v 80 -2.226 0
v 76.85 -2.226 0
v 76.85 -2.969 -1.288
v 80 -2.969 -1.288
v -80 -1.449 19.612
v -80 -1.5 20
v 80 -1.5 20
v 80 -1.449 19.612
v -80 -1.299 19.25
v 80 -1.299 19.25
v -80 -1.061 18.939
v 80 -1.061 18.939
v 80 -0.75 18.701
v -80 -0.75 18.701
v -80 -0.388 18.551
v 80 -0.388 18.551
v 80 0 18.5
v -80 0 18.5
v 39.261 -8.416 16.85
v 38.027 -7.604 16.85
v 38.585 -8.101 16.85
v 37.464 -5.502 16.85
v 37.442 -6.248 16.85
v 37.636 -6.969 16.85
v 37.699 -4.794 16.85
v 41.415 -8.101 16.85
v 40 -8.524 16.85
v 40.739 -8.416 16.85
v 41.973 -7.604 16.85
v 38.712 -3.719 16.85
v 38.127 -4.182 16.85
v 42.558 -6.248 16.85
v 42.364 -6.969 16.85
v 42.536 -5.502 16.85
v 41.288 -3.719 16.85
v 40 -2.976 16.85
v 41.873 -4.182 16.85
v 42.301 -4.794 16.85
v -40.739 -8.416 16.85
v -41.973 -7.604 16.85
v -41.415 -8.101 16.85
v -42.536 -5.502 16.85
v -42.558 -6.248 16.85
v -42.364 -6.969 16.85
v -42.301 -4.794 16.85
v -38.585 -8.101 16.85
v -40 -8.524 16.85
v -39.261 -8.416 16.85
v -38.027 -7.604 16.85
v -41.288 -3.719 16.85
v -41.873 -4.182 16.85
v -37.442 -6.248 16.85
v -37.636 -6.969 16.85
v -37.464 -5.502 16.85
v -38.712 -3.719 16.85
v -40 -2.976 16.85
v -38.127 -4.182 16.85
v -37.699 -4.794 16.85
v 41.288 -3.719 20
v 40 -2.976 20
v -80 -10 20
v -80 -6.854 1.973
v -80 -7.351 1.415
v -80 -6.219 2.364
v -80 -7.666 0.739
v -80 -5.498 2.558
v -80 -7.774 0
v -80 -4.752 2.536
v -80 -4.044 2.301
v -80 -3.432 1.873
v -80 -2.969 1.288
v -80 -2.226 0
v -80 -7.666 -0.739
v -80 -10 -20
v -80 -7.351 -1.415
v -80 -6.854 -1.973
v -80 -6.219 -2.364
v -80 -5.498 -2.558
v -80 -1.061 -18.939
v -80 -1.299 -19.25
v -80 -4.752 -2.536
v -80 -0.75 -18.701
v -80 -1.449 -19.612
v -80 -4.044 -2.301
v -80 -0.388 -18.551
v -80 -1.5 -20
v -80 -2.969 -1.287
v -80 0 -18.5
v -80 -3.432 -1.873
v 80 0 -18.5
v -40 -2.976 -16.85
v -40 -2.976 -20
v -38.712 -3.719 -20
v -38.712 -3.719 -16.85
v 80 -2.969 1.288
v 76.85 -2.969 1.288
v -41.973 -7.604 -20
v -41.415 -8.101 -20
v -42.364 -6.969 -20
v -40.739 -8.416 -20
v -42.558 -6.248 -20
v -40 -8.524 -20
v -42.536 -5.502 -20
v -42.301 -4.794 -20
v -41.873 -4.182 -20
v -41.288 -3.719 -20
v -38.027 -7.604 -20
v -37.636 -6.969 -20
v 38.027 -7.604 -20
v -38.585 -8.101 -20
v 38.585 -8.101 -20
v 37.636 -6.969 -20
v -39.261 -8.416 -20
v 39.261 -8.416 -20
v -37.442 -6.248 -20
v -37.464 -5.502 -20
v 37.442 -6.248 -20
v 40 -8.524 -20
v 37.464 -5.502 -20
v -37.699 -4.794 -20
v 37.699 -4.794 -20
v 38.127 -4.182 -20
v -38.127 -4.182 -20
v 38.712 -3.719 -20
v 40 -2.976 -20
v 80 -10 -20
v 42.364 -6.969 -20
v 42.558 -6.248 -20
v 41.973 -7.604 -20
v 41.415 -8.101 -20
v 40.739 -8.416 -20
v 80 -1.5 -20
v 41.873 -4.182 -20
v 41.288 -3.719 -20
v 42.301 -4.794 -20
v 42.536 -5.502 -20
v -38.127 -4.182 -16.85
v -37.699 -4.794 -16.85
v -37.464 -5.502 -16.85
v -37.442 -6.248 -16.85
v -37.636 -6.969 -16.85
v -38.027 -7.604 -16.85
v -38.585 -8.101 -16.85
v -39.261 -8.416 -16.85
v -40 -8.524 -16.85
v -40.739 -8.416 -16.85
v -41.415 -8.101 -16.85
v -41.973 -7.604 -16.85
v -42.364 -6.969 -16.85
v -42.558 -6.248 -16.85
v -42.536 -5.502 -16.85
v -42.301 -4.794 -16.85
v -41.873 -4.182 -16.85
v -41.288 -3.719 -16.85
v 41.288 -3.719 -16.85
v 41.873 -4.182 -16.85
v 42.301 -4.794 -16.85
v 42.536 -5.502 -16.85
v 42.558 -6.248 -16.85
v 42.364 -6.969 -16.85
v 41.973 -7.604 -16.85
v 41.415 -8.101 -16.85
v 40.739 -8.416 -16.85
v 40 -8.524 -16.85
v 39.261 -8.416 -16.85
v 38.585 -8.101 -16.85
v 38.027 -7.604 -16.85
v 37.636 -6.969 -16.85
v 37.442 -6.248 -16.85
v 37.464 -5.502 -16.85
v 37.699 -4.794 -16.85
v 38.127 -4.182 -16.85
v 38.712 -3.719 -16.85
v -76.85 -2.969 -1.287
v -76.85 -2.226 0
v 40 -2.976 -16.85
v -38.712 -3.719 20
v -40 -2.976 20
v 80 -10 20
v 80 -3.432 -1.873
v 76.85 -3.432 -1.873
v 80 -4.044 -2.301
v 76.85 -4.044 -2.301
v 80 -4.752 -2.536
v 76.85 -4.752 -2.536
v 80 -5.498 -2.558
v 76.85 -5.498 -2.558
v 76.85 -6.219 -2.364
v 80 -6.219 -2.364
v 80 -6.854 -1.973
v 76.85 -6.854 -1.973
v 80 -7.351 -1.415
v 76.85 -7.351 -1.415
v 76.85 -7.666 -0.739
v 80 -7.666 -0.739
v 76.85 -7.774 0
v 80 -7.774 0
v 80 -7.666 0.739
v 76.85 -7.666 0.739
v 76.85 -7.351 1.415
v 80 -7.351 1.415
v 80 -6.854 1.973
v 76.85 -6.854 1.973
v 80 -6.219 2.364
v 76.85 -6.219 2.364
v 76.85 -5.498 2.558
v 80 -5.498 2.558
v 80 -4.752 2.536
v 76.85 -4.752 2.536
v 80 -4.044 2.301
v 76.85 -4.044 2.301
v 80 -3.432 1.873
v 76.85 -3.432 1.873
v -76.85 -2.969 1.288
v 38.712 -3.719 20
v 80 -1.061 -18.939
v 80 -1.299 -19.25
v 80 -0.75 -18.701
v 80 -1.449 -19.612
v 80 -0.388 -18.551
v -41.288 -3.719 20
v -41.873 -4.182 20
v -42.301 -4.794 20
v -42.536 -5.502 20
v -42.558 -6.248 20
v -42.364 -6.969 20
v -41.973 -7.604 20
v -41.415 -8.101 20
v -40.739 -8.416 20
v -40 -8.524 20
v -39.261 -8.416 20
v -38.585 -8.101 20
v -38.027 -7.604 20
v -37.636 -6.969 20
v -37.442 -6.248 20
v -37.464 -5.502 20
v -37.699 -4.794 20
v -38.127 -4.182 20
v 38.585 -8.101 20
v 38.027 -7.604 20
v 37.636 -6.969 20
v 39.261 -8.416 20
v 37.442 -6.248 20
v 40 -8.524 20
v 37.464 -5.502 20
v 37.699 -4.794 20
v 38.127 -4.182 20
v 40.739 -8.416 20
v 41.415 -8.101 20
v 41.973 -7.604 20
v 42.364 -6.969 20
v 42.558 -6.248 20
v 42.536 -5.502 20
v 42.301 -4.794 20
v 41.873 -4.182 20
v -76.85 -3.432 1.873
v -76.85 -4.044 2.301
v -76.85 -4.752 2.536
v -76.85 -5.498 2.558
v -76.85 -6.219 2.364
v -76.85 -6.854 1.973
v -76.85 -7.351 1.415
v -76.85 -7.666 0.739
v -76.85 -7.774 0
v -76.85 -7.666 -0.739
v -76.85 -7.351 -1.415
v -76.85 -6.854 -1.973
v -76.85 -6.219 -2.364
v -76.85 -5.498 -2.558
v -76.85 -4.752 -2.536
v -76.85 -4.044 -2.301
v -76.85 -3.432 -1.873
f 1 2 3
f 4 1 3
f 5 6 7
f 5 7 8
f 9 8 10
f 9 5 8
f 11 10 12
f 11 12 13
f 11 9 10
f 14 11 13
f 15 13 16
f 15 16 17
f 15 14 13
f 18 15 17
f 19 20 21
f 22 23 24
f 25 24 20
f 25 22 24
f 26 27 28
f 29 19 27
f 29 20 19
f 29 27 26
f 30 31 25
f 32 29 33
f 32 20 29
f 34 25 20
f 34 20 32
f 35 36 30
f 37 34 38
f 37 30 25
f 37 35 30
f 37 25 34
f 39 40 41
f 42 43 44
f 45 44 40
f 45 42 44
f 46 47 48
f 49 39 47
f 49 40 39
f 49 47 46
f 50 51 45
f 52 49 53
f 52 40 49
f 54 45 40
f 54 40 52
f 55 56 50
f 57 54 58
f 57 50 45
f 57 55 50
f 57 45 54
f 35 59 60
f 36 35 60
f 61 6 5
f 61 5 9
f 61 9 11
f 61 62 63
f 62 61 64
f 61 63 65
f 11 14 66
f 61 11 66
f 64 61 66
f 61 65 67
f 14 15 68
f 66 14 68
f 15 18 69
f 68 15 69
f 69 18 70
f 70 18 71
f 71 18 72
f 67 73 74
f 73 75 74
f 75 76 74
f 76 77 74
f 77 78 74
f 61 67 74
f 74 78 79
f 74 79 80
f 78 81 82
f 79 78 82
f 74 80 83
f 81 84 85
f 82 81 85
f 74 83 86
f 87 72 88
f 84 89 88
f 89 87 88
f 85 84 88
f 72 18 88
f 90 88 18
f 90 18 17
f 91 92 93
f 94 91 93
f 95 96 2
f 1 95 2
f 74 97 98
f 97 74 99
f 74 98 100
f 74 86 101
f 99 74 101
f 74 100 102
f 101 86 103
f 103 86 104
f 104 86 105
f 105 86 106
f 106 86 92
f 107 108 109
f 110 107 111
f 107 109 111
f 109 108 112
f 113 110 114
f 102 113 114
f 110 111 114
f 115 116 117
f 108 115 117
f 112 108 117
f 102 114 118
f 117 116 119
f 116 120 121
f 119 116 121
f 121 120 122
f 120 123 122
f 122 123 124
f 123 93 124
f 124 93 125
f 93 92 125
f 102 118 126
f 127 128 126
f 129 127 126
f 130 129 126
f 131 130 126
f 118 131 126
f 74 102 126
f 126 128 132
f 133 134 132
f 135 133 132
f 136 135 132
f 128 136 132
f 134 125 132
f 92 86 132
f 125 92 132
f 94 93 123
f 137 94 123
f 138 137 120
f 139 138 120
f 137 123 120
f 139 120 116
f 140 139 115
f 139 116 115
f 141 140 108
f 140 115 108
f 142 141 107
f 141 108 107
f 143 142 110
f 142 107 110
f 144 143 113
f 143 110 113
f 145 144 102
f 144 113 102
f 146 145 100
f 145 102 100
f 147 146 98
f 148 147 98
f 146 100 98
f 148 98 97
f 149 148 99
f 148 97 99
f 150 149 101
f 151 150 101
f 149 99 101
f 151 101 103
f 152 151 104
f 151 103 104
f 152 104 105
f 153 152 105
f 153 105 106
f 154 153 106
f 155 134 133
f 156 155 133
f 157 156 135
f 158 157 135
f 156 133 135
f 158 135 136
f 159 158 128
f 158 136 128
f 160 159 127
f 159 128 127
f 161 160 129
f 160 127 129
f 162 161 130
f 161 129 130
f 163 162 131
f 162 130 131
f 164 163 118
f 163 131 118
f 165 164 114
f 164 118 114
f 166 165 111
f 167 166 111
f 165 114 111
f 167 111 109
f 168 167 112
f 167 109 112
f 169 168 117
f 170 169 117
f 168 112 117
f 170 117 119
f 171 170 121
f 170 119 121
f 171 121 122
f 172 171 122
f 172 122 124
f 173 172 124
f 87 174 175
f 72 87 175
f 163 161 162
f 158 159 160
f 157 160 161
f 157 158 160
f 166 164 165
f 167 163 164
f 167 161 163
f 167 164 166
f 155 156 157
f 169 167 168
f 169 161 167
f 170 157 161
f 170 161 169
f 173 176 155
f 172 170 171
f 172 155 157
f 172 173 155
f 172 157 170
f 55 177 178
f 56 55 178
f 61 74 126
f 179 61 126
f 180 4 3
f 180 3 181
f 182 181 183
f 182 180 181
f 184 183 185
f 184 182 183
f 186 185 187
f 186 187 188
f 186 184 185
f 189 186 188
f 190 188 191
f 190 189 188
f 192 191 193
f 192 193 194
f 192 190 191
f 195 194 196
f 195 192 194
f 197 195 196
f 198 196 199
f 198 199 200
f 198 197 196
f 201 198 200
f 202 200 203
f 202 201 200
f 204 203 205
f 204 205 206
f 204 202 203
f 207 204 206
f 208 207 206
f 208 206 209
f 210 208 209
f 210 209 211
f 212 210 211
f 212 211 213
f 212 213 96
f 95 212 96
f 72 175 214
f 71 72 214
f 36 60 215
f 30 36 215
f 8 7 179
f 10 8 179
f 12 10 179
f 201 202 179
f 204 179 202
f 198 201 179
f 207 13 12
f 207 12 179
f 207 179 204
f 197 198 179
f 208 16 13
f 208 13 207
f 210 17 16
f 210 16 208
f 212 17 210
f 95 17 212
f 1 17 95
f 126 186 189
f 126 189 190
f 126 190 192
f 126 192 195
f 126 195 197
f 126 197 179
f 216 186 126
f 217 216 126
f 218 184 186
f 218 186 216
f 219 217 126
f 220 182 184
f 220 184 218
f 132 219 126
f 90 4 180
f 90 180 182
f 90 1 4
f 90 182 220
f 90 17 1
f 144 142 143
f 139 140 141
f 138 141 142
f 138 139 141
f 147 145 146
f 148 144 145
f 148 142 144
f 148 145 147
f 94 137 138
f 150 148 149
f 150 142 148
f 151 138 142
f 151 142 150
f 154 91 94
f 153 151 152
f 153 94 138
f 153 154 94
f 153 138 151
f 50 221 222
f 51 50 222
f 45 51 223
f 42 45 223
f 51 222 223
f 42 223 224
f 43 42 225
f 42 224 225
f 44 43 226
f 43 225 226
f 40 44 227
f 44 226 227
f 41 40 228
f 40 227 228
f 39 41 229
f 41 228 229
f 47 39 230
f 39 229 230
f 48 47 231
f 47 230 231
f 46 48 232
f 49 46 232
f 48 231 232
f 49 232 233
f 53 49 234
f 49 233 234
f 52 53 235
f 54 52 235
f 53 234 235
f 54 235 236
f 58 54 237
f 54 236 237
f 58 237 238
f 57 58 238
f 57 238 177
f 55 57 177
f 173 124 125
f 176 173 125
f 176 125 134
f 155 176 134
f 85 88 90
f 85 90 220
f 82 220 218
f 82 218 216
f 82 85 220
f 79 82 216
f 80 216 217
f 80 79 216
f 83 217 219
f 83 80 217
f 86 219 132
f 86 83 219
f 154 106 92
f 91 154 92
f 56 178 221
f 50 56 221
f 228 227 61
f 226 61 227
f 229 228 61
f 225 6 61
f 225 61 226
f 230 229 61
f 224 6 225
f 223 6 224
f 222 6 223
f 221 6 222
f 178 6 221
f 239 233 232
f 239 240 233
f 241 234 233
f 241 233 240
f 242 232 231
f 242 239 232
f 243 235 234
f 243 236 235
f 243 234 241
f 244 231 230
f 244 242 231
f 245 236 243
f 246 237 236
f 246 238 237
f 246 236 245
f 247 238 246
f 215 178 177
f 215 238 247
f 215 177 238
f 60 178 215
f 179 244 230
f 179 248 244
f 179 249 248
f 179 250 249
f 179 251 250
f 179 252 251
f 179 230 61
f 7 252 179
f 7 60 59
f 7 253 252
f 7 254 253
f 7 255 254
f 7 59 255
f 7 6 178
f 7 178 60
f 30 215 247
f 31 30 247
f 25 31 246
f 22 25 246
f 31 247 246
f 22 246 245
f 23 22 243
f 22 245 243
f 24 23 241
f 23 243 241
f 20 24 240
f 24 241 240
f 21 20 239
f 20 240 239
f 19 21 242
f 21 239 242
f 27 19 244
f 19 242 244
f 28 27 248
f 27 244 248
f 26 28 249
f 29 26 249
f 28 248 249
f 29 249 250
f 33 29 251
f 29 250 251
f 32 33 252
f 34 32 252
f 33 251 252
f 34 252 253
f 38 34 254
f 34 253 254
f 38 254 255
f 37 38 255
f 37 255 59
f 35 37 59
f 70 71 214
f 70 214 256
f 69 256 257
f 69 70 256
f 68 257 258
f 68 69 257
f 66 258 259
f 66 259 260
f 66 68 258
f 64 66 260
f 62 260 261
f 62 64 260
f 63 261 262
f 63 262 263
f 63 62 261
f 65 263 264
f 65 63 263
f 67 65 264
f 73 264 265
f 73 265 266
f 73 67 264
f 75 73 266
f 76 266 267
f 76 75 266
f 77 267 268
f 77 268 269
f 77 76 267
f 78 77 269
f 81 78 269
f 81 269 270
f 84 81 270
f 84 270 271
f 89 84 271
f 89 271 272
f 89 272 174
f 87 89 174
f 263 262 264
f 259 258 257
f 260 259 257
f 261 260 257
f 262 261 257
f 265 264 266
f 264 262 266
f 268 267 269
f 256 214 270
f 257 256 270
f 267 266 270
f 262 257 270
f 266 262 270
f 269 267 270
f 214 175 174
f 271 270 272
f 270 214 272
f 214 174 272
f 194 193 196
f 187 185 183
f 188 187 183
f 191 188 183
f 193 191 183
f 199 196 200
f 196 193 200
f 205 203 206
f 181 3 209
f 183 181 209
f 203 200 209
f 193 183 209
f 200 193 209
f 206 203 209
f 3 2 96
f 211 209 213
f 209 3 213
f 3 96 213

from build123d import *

# Parameters (mm, degrees)
SKETCH_1_W                         = 160
SKETCH_1_H                         = 40
EXTRUDE_1_DEPTH                    = 10
SWEEP_START                        = -80
SWEEP_1_DEPTH                      = 160
SWEEP_2_DEPTH                      = 160
SKETCH_16_R                        = 2.575
CUT_EXTRUDE_1_DEPTH                = 3.15
PATTERN_LINEAR_1_COUNT             = 2
PATTERN_LINEAR_1_PITCH             = 80
PATTERN_CIRCULAR_1_COUNT           = 2
PATTERN_CIRCULAR_1_COPY_1_SKETCH_R = 2.575
PATTERN_CIRCULAR_1_COPY_1_DEPTH    = 3.15
SKETCH_20_R                        = 2.575
CUT_EXTRUDE_2_DEPTH                = 3.15
PATTERN_CIRCULAR_2_COUNT           = 2


# Read off the part's stored shape, not the designer's step: Вырез-По траектории1, Вырез-По траектории2
with BuildPart() as part:
    # Эскиз1 → Бобышка-Вытянуть1 (new body)
    with BuildSketch(Plane(origin=(0, 0, 0), x_dir=(1, 0, 0), z_dir=(0, 1, 0))):
        Rectangle(SKETCH_1_W, SKETCH_1_H)
    extrude(amount=-EXTRUDE_1_DEPTH)

    # Вырез-По траектории1 outline → Вырез-По траектории1 (cut)
    with BuildSketch(Plane.YZ.offset(SWEEP_START)):
        with BuildLine():
            Line((0, 20), (-1.5, 20))
            ThreePointArc((-1.5, 20), (-1.060660172, 18.939339828), (0, 18.5))
            Line((0, 18.5), (0, 20))
        make_face()
    extrude(amount=SWEEP_1_DEPTH, mode=Mode.SUBTRACT)

    # Вырез-По траектории2 outline → Вырез-По траектории2 (cut)
    with BuildSketch(Plane.YZ.offset(SWEEP_START)):
        with BuildLine():
            ThreePointArc((0, -18.5), (-1.060660172, -18.939339828), (-1.5, -20))
            Line((-1.5, -20), (0, -20))
            Line((0, -20), (0, -18.5))
        make_face()
    extrude(amount=SWEEP_2_DEPTH, mode=Mode.SUBTRACT)

    # Эскиз16 → Вырез-Вытянуть1 (cut)
    with BuildSketch(Plane(origin=(0, 0, -20), x_dir=(-1, 0, 0), z_dir=(0, 0, -1))):
        with Locations((-40, -5.949176943)):
            Circle(SKETCH_16_R)
        with BuildLine():
            Line((-40, -2.975823057), (-41.2875, -3.719161528))
            ThreePointArc((-41.2875, -3.719161528), (-40, -3.374176943), (-38.7125, -3.719161528))
            Line((-38.7125, -3.719161528), (-40, -2.975823057))
        make_face()
    cut_extrude_1 = extrude(amount=-CUT_EXTRUDE_1_DEPTH, mode=Mode.SUBTRACT)

    # Линейный массив1: Вырез-Вытянуть1 ×2
    with Locations(*[(-i * PATTERN_LINEAR_1_PITCH, 0, 0) for i in range(1, PATTERN_LINEAR_1_COUNT)]):
        add(cut_extrude_1, mode=Mode.SUBTRACT)

    # Круговой массив1: Вырез-Вытянуть1 ×2 about axis
    pattern_circular_1_axis = Axis((0, -10, 0), (0, -1, 0))
    for i in range(1, PATTERN_CIRCULAR_1_COUNT):
        add(cut_extrude_1.rotate(pattern_circular_1_axis, i * 360 / PATTERN_CIRCULAR_1_COUNT), mode=Mode.SUBTRACT)

    # Круговой массив1 copy 1 sketch → Круговой массив1 copy 1 (cut)
    with BuildSketch(Plane(origin=(80, 0, 20), x_dir=(1, 0, 0), z_dir=(0, 0, 1))):
        with Locations((-40, -5.949176943)):
            Circle(PATTERN_CIRCULAR_1_COPY_1_SKETCH_R)
        with BuildLine():
            Line((-40, -2.975823057), (-41.2875, -3.719161528))
            ThreePointArc((-41.2875, -3.719161528), (-40, -3.374176943), (-38.7125, -3.719161528))
            Line((-38.7125, -3.719161528), (-40, -2.975823057))
        make_face()
    extrude(amount=-PATTERN_CIRCULAR_1_COPY_1_DEPTH, mode=Mode.SUBTRACT)

    # Эскиз20 → Вырез-Вытянуть2 (cut)
    with BuildSketch(Plane.ZY.offset(-80)):
        with Locations((0, -5.199176943)):
            Circle(SKETCH_20_R)
        with BuildLine():
            Line((1.2875, -2.969161528), (0, -2.225823057))
            Line((0, -2.225823057), (-1.2875, -2.969161528))
            ThreePointArc((-1.2875, -2.969161528), (0, -2.624176943), (1.2875, -2.969161528))
        make_face()
    cut_extrude_2 = extrude(amount=CUT_EXTRUDE_2_DEPTH, mode=Mode.SUBTRACT)

    # Круговой массив2: Вырез-Вытянуть2 ×2 about axis
    pattern_circular_2_axis = Axis((0, -10, 0), (0, -1, 0))
    for i in range(1, PATTERN_CIRCULAR_2_COUNT):
        add(cut_extrude_2.rotate(pattern_circular_2_axis, i * 360 / PATTERN_CIRCULAR_2_COUNT), mode=Mode.SUBTRACT)


solid = part.part
